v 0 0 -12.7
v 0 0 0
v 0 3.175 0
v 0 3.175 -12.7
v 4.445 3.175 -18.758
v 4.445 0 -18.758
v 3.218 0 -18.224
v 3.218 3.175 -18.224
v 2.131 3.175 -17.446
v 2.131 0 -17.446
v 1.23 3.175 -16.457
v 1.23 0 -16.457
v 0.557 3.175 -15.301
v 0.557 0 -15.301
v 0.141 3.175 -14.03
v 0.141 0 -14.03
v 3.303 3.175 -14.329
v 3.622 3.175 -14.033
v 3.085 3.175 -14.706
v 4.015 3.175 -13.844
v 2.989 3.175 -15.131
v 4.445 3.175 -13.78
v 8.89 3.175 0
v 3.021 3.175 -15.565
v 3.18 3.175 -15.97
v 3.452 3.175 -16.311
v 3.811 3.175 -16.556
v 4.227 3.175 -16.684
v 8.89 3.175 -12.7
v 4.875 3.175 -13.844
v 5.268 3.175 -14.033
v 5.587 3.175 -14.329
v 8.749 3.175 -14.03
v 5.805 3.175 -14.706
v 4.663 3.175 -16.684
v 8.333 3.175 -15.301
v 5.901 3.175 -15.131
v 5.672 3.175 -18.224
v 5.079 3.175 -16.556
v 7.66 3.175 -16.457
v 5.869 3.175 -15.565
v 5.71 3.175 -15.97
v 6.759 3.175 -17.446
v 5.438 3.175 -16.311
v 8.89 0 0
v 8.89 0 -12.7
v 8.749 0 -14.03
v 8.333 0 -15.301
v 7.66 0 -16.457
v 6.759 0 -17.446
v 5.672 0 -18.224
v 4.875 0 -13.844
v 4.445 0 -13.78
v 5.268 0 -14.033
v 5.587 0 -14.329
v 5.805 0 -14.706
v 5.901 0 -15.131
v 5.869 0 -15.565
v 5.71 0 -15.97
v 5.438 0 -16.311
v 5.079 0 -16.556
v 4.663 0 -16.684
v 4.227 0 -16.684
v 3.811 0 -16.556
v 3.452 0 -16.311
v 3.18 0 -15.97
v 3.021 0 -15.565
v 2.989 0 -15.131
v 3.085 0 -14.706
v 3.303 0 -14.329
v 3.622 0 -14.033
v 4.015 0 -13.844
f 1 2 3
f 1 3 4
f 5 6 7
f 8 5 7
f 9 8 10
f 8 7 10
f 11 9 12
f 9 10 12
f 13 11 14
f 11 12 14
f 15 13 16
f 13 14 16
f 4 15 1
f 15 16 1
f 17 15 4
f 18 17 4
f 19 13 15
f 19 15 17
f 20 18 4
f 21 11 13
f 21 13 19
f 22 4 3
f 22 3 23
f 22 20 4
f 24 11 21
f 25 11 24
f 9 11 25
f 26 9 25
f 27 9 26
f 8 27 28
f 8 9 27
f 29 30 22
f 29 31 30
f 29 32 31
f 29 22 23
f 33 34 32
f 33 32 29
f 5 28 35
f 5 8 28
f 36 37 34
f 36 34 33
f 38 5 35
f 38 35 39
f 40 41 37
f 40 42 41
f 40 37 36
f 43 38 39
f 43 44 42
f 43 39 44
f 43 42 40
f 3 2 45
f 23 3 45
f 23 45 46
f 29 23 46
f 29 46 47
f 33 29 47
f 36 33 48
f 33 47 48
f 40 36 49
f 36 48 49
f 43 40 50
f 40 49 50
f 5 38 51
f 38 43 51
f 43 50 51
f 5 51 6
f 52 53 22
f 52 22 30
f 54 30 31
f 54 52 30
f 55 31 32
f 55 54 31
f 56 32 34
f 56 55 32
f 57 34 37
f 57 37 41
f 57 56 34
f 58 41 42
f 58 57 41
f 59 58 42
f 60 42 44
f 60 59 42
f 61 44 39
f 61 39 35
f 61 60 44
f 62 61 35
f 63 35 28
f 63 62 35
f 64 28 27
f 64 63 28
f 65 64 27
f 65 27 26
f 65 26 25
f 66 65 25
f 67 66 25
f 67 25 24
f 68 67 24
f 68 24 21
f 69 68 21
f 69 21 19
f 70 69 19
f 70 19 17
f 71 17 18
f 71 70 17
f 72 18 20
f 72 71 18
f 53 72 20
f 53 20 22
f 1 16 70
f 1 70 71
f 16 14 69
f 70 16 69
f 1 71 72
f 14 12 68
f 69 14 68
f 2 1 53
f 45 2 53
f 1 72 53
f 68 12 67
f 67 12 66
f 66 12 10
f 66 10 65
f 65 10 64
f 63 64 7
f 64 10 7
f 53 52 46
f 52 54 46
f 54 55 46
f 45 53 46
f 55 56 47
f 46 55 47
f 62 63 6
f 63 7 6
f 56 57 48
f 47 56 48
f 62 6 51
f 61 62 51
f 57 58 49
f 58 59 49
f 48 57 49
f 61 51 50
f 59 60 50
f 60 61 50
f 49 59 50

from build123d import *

# Parameters (mm, degrees)
SKETCH1_W           = 8.89
SKETCH1_H           = 19.05
SKETCH1_R           = 1.4605
BOSS_EXTRUDE1_DEPTH = 3.175
FILLET1_R           = 6.35


with BuildPart() as part:
    # Sketch1 → Boss-Extrude1 (new body)
    with BuildSketch(Plane(origin=(0, 0, 0), x_dir=(1, 0, 0), z_dir=(0, 1, 0))):
        with Locations((4.445, 9.525)):
            Rectangle(SKETCH1_W, SKETCH1_H)
        with Locations(Location((4.445, 15.24, 0), (0, 0, 270))):
            Circle(SKETCH1_R, mode=Mode.SUBTRACT)
    extrude(amount=BOSS_EXTRUDE1_DEPTH)

    # Fillet1
    # the kernel refuses this fillet: 6.35 mm, written as the material it takes off along each edge
    with BuildSketch(Plane(origin=(8.89, -15.875, -19.05), x_dir=(0, 0, 1), z_dir=(0, 1, 0)), Plane(origin=(0, -15.875, -19.05), x_dir=(1, 0, 0), z_dir=(0, 1, 0))) as fillet1_piece_1:
        with BuildLine():
            CenterArc((FILLET1_R, -FILLET1_R), FILLET1_R, 90, 90)
            Line((0, -FILLET1_R), (0, 0))
            Line((0, 0), (FILLET1_R, 0))
        make_face()
    extrude(amount=34.925, mode=Mode.SUBTRACT)


solid = part.part
